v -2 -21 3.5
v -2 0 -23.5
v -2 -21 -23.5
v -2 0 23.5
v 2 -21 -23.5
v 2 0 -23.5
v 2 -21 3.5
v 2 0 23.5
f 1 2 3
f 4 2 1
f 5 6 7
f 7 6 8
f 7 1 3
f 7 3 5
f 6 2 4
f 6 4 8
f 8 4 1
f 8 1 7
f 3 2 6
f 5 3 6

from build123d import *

# Parameters (mm, degrees)
F0_W     = 4
F0_H     = 47
F1_DEPTH = 21
F2_SIZE2 = 20.99999
F2_SIZE  = 19.99999


# Not quite as in the source:
# - a fillet or chamfer is up to 0.001 mm smaller than in the source, because OpenCascade refuses the exact size


with BuildPart() as f1:
    # F0 (on Front) → F1 (new body)
    with BuildSketch(Plane.XZ):
        Rectangle(F0_W, F0_H)
    extrude(amount=F1_DEPTH)

    # F2 (size 20 and 21 in the source; OpenCascade refuses exactly that, so slightly less here)
    f2_edges = [f1.edges().sort_by_distance(p)[0] for p in [
        (0, -21, 23.5),
    ]]
    f2_side = f1.faces().sort_by_distance((0, -21, 0))[0]
    chamfer(f2_edges, length=F2_SIZE, length2=F2_SIZE2, reference=f2_side)


solid = f1.part
